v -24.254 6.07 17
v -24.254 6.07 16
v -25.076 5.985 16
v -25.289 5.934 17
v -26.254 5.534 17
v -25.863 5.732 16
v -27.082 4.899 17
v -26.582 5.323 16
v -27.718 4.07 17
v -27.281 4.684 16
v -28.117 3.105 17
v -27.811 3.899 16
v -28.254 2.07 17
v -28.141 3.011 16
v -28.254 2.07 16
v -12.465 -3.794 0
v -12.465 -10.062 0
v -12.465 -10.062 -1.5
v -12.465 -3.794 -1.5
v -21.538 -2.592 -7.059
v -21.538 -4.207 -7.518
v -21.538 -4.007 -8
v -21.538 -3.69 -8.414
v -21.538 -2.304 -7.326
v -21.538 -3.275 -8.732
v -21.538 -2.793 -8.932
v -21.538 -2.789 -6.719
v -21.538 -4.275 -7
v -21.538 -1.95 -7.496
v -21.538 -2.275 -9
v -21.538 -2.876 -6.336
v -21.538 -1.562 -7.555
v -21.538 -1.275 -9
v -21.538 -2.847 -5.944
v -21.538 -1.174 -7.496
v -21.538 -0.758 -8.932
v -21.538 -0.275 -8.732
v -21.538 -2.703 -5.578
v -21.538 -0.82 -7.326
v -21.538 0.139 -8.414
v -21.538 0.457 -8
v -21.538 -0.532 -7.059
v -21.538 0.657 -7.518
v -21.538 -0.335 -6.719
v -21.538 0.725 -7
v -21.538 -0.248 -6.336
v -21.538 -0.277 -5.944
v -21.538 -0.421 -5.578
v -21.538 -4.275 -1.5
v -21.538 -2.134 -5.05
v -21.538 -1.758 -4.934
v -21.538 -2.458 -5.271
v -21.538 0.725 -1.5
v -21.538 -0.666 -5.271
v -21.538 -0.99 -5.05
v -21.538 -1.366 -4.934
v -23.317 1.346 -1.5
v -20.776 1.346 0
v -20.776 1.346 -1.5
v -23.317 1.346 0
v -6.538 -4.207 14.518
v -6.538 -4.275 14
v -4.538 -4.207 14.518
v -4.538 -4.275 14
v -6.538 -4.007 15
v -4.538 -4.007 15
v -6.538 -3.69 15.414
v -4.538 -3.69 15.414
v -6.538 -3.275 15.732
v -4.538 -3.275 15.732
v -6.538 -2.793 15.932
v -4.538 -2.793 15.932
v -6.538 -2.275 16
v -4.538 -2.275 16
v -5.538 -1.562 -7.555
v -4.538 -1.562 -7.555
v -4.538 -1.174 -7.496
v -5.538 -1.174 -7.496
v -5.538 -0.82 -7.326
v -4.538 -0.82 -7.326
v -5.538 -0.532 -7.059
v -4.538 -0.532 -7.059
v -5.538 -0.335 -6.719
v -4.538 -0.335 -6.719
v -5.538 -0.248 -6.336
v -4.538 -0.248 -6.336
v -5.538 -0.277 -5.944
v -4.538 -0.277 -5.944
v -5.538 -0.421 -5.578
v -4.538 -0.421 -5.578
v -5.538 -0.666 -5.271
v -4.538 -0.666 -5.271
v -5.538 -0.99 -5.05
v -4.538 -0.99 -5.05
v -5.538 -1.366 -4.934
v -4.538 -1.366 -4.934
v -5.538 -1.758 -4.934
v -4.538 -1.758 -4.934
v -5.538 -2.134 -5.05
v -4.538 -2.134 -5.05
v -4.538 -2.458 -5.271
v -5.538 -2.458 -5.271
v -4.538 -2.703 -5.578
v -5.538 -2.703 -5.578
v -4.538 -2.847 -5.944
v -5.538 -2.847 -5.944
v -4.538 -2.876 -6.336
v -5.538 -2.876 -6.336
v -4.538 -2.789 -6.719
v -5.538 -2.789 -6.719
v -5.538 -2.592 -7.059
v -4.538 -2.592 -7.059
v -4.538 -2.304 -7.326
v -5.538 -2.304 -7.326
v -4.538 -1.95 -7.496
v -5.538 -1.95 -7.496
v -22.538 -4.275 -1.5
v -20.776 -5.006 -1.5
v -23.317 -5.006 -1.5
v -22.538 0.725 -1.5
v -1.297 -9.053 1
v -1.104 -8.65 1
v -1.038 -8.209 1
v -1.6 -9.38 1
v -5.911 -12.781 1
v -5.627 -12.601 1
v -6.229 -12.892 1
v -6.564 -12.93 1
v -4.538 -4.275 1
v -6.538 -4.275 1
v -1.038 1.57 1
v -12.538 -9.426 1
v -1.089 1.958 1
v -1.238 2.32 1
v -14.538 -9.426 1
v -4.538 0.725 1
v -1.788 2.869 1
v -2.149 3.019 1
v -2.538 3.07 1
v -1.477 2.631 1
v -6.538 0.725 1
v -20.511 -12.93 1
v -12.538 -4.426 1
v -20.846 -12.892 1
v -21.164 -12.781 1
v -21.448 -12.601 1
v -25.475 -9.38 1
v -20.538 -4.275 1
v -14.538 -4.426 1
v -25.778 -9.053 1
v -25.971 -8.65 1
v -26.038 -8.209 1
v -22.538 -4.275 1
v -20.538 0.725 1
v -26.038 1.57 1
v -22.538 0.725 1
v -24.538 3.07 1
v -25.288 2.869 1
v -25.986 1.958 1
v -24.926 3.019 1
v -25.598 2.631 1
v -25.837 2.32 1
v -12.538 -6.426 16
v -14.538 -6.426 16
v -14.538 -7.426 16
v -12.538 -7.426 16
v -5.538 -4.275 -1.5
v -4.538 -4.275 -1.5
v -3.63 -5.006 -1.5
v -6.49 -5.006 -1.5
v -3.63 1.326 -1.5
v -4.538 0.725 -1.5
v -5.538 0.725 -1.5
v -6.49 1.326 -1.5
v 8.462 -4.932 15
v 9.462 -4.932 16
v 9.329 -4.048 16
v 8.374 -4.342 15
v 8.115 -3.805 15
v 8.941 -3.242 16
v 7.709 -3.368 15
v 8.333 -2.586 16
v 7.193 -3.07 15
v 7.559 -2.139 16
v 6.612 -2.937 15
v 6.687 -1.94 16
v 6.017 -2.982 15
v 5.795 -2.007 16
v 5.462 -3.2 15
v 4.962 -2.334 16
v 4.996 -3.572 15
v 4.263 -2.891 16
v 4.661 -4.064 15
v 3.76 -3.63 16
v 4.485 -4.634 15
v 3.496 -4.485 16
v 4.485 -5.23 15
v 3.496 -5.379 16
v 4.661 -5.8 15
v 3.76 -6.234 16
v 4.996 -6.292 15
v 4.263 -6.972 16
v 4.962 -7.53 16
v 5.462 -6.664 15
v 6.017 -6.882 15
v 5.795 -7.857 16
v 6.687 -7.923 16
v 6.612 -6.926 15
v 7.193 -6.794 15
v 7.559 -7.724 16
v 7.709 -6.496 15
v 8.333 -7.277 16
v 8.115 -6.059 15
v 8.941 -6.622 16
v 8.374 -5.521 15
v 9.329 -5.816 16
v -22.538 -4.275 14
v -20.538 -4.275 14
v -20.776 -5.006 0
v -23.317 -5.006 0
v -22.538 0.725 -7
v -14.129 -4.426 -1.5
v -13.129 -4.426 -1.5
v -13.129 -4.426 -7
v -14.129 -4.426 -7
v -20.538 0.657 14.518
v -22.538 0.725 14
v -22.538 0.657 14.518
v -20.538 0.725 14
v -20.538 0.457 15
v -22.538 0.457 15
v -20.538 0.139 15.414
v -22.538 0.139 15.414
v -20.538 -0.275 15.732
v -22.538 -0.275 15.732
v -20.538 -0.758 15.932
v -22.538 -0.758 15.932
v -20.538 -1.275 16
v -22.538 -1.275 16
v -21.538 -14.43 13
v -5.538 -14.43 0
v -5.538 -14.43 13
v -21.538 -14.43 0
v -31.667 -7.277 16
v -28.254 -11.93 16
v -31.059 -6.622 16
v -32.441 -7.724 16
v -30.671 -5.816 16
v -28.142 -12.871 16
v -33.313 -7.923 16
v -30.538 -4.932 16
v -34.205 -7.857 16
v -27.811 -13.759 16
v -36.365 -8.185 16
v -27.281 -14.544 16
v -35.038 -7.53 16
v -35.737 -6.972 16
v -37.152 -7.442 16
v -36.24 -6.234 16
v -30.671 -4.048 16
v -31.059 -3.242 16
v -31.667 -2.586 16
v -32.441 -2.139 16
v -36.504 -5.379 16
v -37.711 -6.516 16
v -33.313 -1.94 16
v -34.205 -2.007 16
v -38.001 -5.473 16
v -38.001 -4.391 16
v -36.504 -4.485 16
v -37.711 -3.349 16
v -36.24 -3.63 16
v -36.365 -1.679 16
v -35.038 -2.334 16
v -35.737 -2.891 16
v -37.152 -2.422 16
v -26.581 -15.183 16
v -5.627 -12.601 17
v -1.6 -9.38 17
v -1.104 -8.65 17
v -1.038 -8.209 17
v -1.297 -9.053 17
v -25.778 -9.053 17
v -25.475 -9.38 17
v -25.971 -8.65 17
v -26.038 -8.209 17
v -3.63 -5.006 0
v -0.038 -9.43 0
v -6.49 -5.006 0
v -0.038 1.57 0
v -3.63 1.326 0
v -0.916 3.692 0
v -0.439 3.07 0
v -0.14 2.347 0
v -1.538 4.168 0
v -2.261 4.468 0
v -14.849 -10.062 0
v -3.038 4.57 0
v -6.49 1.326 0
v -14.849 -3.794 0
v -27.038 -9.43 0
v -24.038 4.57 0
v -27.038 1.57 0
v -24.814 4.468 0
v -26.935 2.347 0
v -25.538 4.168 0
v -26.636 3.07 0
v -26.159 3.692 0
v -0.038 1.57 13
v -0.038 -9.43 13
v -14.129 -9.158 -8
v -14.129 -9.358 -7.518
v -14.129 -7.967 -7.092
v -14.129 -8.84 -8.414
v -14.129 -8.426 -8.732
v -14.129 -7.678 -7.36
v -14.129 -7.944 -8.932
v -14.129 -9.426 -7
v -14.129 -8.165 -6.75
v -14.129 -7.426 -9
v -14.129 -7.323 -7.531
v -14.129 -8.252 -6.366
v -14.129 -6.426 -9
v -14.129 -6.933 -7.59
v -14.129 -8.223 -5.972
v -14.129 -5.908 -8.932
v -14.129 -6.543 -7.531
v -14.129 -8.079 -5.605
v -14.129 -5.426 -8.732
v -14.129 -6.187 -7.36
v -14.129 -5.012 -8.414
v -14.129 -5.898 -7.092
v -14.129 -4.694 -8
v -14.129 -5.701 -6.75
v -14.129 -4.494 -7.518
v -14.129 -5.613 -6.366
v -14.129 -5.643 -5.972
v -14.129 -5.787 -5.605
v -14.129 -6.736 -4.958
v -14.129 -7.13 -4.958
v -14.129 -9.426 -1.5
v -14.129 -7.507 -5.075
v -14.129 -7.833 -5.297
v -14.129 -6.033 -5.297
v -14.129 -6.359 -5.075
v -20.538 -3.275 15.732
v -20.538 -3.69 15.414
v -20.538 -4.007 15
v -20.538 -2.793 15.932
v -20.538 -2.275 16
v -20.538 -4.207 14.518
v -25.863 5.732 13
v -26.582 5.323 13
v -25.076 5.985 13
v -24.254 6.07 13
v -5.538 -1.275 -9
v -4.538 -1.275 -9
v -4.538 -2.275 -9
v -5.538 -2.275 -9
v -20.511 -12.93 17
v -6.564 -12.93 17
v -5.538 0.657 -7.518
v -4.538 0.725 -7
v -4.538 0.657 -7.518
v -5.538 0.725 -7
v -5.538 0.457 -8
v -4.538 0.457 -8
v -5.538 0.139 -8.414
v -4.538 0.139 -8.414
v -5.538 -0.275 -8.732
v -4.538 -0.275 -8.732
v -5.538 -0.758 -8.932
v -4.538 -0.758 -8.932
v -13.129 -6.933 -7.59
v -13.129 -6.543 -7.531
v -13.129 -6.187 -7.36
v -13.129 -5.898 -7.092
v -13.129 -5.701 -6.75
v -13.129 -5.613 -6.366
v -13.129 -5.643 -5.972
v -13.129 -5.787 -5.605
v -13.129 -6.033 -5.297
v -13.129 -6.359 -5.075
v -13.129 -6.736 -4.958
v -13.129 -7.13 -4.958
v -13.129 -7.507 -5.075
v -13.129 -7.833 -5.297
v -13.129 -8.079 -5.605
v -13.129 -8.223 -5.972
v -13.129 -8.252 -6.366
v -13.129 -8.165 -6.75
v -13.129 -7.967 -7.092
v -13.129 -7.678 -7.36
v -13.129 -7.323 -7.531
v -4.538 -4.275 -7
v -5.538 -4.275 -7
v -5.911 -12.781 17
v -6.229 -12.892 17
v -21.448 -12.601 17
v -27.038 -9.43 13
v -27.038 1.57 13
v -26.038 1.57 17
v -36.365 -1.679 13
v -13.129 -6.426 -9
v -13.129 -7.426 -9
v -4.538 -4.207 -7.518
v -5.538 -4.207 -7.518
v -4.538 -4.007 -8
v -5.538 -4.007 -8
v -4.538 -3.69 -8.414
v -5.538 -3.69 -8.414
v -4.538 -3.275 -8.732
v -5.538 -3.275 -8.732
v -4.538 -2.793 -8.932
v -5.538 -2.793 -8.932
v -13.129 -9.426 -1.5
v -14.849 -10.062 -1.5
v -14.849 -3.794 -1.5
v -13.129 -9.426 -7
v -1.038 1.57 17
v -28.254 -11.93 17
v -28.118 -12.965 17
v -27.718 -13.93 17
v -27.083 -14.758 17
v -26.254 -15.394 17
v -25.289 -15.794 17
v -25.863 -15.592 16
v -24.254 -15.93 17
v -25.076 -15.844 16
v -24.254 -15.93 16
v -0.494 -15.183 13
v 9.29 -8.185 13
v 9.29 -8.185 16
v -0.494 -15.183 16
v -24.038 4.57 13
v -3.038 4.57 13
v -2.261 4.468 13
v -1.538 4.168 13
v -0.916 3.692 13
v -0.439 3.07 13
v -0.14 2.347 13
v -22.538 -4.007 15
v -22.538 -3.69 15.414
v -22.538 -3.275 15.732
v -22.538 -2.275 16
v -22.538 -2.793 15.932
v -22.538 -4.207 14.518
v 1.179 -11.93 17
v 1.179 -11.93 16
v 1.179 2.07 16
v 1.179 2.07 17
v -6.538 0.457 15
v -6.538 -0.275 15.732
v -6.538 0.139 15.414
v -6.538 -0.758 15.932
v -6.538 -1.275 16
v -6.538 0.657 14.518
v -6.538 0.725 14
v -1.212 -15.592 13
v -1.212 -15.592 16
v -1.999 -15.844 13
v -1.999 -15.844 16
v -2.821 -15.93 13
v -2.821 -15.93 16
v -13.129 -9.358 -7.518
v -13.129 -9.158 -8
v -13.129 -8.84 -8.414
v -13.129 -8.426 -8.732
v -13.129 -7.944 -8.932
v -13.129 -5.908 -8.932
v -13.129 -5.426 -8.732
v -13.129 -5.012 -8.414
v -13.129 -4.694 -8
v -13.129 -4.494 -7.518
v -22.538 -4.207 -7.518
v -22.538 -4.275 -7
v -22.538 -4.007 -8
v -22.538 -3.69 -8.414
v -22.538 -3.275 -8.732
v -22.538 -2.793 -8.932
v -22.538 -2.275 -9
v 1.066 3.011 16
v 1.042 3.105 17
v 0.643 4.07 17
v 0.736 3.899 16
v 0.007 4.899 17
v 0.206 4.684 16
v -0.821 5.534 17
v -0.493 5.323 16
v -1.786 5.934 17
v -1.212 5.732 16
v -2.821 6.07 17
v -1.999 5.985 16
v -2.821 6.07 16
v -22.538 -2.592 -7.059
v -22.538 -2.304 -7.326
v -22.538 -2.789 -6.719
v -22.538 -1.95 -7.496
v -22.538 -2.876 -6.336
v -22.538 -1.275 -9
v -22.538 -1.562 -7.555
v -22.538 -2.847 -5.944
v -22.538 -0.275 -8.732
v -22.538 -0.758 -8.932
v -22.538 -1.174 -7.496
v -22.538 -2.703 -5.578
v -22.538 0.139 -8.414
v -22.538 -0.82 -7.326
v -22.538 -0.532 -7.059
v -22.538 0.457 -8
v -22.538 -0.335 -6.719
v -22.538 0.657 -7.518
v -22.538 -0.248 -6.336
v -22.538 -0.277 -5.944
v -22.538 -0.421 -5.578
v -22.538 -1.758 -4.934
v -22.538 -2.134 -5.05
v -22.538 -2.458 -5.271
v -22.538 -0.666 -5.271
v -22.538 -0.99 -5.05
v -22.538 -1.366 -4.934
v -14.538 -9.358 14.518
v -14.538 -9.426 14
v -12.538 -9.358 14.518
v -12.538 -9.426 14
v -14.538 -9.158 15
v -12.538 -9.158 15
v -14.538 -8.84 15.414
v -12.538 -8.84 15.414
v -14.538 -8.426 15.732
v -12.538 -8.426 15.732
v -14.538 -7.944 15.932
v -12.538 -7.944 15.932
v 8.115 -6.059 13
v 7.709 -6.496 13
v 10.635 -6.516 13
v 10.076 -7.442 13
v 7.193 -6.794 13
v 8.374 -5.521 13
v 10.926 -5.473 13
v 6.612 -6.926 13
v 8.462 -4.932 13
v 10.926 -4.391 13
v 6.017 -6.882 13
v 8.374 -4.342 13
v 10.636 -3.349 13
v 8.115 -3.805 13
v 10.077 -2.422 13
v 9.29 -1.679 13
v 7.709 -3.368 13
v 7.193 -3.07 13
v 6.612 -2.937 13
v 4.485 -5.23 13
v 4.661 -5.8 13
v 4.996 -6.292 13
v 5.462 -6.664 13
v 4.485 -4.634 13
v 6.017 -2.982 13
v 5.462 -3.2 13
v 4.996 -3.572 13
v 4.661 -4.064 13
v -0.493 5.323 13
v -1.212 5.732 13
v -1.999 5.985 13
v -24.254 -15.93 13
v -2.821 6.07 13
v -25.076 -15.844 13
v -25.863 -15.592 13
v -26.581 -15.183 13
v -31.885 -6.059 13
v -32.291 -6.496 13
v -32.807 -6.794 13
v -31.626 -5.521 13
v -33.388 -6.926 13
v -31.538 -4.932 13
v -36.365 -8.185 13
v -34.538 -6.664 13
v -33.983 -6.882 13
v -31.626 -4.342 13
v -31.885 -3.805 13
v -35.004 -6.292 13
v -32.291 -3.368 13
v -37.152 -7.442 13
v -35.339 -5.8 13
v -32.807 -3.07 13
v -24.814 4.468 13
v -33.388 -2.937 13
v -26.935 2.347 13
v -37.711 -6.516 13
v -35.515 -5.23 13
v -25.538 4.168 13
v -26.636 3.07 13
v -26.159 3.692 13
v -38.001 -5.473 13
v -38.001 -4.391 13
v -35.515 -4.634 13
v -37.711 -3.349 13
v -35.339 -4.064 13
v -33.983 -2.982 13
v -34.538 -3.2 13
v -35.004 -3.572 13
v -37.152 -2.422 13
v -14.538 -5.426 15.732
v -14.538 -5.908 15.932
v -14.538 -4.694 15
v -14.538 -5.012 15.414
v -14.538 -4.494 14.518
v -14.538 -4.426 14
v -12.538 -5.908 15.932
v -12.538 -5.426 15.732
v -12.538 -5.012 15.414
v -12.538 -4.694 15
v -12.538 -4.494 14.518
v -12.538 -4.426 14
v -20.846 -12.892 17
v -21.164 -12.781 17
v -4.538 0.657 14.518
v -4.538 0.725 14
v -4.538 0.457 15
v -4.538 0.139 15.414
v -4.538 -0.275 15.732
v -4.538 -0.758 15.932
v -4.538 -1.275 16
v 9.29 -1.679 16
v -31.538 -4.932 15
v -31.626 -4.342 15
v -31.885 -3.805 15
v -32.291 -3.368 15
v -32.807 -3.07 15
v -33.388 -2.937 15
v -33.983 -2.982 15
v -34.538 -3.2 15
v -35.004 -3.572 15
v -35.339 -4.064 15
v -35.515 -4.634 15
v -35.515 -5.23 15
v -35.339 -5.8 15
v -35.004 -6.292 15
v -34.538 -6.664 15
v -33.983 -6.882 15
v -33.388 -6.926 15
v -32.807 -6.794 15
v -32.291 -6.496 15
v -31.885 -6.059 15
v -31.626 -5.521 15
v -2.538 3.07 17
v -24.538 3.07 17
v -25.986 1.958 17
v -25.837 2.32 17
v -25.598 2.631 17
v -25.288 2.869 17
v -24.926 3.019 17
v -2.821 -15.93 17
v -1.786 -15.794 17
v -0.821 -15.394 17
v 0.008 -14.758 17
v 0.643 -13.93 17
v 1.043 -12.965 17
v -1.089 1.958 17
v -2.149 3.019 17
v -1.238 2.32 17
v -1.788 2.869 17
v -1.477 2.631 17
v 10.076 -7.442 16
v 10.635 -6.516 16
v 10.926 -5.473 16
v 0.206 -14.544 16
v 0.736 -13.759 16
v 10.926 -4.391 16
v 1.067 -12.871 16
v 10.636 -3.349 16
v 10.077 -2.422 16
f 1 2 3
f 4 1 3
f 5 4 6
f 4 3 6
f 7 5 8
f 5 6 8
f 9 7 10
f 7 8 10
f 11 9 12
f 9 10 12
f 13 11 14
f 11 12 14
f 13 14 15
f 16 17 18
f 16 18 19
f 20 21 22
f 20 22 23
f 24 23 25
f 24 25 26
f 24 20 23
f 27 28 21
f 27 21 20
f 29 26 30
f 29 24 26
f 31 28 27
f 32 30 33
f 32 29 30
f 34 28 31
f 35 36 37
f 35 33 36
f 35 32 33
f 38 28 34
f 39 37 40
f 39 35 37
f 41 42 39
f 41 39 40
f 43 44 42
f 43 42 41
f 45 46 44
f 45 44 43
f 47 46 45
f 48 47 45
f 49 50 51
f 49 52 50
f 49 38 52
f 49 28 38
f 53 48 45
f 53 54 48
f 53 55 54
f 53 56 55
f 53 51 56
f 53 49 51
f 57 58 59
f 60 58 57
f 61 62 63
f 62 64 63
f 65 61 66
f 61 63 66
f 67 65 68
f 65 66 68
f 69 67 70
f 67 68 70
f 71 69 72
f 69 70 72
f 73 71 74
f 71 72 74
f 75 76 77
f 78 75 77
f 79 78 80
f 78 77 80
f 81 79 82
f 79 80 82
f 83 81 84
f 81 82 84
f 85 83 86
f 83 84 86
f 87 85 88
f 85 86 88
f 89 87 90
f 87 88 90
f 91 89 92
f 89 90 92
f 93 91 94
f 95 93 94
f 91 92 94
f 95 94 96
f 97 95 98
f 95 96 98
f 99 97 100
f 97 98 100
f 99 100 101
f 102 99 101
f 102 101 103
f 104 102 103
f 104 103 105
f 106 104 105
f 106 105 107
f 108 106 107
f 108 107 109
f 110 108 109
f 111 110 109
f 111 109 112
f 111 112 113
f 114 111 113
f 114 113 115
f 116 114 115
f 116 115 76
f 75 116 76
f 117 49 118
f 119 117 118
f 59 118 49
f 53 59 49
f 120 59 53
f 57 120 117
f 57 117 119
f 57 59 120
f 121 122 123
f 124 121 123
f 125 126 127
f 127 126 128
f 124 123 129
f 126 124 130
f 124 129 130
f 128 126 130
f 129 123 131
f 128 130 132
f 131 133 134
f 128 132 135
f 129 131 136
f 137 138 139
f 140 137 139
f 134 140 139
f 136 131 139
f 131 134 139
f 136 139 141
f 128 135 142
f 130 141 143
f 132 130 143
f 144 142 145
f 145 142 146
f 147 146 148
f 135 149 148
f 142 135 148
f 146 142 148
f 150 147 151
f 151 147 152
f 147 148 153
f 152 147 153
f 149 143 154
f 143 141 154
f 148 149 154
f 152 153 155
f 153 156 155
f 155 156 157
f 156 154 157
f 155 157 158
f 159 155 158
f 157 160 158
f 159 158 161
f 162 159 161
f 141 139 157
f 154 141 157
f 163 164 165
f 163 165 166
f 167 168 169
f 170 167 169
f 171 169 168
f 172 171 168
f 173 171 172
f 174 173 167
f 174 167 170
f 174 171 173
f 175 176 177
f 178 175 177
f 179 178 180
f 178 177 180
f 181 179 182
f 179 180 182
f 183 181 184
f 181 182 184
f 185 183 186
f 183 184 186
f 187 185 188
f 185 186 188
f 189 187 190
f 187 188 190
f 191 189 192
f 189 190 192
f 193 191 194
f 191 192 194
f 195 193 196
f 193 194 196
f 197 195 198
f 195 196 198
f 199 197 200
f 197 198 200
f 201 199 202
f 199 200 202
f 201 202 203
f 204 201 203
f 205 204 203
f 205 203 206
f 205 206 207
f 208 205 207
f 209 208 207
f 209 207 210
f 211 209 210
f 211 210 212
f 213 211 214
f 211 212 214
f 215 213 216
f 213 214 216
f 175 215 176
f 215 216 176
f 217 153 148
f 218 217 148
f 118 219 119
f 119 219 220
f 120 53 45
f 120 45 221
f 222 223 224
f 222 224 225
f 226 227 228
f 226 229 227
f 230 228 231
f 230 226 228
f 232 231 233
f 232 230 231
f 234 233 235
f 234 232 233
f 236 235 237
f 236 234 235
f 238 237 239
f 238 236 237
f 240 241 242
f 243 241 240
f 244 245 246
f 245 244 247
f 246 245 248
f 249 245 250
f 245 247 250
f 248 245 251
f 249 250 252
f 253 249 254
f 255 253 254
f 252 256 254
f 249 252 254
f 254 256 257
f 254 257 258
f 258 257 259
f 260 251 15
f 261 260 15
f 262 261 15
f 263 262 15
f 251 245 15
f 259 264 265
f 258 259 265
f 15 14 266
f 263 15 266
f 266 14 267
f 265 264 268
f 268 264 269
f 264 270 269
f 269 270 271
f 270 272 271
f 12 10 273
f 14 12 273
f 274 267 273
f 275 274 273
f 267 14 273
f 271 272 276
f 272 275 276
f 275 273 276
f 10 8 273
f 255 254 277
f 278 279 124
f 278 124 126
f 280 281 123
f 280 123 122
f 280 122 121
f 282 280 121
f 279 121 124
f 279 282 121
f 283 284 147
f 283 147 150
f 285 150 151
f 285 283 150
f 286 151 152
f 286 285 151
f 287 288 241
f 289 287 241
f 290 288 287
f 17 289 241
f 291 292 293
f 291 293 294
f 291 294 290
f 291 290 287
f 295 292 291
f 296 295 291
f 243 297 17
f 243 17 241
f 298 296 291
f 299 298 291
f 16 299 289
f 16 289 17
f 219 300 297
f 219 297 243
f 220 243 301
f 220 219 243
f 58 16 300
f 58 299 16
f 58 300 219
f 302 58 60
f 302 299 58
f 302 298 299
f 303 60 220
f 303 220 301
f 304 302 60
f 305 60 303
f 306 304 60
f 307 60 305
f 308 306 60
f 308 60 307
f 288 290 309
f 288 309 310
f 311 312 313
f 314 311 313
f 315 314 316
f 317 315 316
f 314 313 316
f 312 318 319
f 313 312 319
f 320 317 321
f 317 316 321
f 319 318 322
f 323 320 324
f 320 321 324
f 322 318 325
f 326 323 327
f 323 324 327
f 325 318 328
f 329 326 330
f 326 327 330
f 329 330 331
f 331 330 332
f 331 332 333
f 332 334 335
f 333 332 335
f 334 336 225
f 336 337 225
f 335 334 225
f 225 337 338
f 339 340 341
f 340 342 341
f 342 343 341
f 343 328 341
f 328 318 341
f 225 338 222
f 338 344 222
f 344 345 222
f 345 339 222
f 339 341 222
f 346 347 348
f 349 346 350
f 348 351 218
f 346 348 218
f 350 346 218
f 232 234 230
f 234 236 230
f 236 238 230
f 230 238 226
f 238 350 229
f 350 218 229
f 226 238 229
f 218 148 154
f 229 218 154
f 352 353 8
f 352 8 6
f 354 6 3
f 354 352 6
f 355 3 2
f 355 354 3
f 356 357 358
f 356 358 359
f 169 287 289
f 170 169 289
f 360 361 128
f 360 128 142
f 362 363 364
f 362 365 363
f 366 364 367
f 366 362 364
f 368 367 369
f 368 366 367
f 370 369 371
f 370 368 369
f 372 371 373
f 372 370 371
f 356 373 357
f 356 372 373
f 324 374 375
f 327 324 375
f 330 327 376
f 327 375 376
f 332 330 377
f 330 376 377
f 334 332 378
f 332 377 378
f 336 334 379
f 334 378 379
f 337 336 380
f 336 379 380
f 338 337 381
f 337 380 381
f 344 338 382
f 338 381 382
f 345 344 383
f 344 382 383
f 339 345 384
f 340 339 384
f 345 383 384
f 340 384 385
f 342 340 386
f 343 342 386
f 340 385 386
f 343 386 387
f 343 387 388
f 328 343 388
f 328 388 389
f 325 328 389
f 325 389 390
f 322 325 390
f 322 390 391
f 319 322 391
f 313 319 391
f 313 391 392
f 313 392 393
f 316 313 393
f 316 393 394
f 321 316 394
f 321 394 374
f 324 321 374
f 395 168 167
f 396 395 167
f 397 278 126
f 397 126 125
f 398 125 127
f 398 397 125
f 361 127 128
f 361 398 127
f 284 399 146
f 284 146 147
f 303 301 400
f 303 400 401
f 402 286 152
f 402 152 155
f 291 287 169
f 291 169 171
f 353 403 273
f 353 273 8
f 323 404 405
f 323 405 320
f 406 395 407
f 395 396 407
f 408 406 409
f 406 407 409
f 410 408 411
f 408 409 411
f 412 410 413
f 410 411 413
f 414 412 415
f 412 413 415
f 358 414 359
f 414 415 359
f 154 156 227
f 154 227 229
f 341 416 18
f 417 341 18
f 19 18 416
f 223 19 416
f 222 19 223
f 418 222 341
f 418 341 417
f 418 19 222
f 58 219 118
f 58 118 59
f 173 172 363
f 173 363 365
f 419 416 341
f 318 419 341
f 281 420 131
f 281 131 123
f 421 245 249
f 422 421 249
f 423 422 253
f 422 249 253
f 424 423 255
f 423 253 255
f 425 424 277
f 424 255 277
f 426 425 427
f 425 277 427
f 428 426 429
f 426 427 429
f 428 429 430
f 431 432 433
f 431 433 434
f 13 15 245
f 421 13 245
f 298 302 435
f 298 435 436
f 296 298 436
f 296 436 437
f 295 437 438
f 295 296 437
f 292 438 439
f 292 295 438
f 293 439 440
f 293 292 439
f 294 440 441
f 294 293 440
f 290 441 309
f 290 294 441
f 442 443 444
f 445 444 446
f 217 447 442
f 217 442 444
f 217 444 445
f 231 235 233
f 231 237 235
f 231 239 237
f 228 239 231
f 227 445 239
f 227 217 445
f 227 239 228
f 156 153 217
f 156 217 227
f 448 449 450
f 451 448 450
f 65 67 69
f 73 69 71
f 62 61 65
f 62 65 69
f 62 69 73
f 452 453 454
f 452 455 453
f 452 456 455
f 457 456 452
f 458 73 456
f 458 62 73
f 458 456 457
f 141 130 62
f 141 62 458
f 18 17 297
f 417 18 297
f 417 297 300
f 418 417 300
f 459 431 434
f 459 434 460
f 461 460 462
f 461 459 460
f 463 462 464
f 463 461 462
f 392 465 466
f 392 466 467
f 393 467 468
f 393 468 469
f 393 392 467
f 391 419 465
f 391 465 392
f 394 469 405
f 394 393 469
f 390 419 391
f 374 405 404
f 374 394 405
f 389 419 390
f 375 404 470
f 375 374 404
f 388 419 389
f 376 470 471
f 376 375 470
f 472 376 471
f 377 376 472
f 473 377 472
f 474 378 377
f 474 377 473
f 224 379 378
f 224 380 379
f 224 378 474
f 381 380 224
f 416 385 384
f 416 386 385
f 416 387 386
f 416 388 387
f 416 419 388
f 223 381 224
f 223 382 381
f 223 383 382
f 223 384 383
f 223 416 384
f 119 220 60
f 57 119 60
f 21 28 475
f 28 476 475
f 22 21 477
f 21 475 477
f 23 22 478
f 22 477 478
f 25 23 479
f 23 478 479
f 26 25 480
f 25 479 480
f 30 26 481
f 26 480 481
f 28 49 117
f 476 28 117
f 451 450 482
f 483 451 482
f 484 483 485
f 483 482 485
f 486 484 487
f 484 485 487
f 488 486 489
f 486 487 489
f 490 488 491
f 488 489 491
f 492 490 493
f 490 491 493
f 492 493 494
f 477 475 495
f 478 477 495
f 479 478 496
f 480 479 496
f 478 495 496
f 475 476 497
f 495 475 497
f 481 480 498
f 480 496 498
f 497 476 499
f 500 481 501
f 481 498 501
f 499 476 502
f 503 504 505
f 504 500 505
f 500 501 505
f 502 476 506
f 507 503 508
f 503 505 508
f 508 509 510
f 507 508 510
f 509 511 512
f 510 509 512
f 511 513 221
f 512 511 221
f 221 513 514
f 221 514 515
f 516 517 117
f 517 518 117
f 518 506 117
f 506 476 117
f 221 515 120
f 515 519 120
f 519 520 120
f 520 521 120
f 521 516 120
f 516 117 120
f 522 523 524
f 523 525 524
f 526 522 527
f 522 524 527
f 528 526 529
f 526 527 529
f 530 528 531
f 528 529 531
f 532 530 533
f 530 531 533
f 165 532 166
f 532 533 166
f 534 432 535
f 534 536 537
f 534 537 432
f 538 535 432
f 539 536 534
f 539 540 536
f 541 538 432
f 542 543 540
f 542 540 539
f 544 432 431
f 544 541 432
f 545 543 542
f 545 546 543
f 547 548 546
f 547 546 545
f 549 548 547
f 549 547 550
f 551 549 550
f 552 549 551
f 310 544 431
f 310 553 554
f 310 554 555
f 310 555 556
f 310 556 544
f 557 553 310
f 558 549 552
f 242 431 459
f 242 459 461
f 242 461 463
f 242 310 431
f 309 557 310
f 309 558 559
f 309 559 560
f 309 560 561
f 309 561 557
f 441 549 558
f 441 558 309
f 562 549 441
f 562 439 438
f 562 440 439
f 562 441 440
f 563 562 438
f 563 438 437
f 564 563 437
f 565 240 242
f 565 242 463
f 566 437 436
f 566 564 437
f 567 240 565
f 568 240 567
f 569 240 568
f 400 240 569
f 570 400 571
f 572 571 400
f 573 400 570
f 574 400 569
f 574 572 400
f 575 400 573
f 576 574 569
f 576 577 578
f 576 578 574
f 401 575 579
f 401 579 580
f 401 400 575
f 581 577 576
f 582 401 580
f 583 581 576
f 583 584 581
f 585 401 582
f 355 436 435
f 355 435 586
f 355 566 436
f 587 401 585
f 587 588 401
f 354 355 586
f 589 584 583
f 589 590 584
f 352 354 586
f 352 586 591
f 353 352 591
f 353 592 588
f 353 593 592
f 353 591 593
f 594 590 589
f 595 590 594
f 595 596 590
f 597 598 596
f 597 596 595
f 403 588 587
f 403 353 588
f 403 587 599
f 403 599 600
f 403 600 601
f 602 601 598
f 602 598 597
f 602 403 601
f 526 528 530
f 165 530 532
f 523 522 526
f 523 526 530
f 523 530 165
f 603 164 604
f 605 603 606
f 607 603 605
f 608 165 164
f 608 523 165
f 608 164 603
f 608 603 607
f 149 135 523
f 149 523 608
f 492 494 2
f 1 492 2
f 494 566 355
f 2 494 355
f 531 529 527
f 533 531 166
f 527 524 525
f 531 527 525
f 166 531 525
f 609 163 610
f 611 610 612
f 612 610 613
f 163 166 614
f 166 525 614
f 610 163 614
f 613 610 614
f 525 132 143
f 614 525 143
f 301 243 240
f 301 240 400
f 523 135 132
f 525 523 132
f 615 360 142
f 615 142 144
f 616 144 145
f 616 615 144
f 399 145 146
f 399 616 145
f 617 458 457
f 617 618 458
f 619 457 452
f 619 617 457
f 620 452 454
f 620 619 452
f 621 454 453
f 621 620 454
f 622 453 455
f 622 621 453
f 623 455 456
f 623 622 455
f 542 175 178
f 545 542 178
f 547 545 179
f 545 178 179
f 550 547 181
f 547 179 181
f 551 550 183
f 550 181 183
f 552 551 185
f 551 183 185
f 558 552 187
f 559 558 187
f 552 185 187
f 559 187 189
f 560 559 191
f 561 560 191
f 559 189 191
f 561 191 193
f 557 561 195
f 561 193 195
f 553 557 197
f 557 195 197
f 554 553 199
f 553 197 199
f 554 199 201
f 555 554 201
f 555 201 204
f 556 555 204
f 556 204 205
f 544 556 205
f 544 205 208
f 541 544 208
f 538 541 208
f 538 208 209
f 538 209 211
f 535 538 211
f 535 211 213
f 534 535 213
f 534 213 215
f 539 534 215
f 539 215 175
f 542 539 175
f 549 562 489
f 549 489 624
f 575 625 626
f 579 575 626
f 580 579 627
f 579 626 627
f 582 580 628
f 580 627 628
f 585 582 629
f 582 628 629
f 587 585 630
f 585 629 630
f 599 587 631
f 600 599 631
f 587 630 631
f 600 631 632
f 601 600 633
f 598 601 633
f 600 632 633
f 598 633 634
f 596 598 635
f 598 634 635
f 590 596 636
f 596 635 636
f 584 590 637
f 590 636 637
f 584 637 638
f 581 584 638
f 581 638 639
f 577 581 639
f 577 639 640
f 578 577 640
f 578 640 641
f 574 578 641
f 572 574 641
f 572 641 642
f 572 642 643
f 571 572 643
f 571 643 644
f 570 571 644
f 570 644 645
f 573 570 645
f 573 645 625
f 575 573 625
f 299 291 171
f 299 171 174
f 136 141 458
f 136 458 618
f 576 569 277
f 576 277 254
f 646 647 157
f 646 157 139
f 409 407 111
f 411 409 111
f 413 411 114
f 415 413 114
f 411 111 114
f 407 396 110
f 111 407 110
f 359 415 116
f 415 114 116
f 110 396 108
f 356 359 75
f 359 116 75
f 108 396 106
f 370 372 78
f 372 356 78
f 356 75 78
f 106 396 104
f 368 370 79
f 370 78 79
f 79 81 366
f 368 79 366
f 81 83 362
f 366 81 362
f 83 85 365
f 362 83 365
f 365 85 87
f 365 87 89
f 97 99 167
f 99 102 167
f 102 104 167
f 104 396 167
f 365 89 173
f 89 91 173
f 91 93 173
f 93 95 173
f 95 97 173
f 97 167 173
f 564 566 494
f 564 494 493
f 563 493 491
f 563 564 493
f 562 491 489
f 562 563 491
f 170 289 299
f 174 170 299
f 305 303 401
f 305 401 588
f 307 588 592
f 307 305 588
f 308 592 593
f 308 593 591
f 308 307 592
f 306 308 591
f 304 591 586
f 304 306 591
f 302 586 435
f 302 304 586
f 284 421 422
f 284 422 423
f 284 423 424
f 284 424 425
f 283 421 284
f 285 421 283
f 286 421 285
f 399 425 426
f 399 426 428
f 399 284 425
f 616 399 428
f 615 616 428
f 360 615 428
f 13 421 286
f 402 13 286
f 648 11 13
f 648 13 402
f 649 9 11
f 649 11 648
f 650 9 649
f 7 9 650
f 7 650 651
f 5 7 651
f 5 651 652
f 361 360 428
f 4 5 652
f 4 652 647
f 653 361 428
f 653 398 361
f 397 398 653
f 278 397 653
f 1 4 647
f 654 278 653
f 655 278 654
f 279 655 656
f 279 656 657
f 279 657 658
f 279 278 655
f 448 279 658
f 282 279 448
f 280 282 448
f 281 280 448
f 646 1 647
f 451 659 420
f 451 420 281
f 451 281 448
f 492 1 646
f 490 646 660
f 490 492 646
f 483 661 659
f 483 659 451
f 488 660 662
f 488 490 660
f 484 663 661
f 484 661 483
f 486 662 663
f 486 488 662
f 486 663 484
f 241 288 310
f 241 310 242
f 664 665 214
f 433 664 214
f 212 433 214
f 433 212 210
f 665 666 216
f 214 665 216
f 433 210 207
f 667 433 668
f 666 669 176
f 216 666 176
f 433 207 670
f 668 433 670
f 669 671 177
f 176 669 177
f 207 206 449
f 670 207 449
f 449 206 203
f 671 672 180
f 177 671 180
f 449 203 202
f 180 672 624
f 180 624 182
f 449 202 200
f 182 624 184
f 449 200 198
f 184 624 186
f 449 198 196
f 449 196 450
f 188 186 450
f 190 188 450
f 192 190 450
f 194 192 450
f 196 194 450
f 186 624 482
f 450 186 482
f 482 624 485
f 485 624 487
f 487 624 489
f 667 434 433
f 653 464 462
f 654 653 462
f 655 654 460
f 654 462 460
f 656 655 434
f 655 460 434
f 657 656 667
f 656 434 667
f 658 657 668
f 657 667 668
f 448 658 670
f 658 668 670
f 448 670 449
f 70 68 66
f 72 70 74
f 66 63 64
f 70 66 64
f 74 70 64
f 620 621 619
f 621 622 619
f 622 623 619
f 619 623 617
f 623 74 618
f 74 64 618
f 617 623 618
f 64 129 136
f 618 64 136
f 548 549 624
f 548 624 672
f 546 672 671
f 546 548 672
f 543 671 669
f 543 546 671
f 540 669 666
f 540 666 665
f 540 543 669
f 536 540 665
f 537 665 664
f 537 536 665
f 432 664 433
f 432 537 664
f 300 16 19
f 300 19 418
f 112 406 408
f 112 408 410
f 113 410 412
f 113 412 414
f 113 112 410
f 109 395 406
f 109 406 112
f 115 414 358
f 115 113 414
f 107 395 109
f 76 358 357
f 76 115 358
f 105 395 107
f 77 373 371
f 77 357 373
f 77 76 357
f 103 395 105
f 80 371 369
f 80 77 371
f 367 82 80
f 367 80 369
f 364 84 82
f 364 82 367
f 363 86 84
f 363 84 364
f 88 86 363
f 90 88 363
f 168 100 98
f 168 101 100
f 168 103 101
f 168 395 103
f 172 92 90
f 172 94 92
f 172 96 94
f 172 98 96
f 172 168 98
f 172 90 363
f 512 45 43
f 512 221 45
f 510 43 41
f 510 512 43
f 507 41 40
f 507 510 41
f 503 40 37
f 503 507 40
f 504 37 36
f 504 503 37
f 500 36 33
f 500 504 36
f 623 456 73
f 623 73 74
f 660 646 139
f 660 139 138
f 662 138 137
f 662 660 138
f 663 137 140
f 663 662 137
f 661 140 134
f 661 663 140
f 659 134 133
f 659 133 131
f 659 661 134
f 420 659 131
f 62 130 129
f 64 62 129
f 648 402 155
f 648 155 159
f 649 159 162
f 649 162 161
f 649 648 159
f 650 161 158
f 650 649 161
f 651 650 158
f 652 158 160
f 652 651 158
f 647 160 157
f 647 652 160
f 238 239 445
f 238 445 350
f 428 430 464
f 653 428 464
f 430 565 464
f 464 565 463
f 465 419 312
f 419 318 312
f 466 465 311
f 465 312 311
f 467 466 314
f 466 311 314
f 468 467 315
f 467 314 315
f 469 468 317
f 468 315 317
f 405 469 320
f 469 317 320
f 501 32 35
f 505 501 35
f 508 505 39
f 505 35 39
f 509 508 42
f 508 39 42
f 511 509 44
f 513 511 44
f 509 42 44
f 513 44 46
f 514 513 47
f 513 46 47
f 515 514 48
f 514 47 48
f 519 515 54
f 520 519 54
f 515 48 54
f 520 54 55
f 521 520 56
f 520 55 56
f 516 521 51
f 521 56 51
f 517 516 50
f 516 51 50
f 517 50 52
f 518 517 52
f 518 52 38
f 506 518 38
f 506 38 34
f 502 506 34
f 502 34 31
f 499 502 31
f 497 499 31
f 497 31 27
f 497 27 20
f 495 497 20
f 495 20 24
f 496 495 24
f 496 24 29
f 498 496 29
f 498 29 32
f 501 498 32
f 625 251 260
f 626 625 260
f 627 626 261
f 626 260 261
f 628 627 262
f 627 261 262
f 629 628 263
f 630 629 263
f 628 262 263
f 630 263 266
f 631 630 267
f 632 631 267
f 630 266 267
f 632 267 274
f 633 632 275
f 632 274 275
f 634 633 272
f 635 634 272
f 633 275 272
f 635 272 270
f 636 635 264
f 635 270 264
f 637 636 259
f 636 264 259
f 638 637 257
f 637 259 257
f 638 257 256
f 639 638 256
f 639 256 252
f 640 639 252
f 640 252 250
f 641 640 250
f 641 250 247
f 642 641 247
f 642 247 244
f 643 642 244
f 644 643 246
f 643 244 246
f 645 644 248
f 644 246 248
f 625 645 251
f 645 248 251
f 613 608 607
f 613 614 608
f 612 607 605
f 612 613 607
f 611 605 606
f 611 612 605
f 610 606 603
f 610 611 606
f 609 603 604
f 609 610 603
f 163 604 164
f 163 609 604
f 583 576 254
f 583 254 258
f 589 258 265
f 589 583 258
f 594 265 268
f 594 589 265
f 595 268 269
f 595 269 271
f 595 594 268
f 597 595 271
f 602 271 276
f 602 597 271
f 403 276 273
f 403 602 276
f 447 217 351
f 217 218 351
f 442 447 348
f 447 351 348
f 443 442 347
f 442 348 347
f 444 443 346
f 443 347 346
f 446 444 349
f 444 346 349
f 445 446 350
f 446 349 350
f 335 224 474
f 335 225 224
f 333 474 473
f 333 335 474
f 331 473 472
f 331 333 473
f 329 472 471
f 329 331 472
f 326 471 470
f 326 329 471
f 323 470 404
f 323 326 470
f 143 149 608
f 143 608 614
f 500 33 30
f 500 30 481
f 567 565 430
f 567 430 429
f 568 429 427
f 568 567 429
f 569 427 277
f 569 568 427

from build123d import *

# Parameters (mm, degrees)
EXTRUDE_1_DEPTH     = 13
EXTRUDE_2_DEPTH     = 3
EXTRUDE_3_DEPTH     = 1
CUT_EXTRUDE_1_DEPTH = 16
SKETCH_5_W          = 2
SKETCH_5_H          = 5
EXTRUDE_4_DEPTH     = 15
FILLET_1_R          = 2
SKETCH_6_W          = 1.000000004
SKETCH_6_H          = 5
SKETCH_6_W_2        = 0.999999996
SKETCH_6_W_3        = 1
EXTRUDE_5_DEPTH     = 9
SKETCH_7_W          = 2.859887346
SKETCH_7_H          = 6.332607693
SKETCH_7_W_2        = 2.383674024
SKETCH_7_H_2        = 6.268510199
SKETCH_7_W_3        = 2.540472095
SKETCH_7_H_3        = 6.351983774
EXTRUDE_7_DEPTH     = 1.5
SKETCH_8_R          = 1.317694444
CUT_EXTRUDE_2_DEPTH = 21.5
SKETCH_9_R          = 1.323361973
CUT_EXTRUDE_3_DEPTH = 3.5
FILLET_2_R          = 2
SKETCH_10_R         = 2
CUT_EXTRUDE_4_DEPTH = 3.5
SKETCH_11_R         = 2
CUT_EXTRUDE_5_DEPTH = 3.5
CHAMFER_1_SIZE      = 1


with BuildPart() as part:
    # Эскиз1 → Бобышка-Вытянуть1 (new body)
    with BuildSketch(Plane.XY):
        with BuildLine():
            Line((-24.03751348, 4.570186882), (-3.03751348, 4.570186882))
            ThreePointArc((-3.03751348, 4.570186882), (-0.916193137, 3.691507225), (-0.03751348, 1.570186882))
            Line((-0.03751348, 1.570186882), (-0.03751348, -9.429813118))
            Line((-0.03751348, -9.429813118), (-5.53751348, -14.429813118))
            Line((-5.53751348, -14.429813118), (-21.53751348, -14.429813118))
            Line((-21.53751348, -14.429813118), (-27.03751348, -9.429813118))
            Line((-27.03751348, -9.429813118), (-27.03751348, 1.570186882))
            ThreePointArc((-27.03751348, 1.570186882), (-26.158833824, 3.691507225), (-24.03751348, 4.570186882))
        make_face()
    extrude(amount=EXTRUDE_1_DEPTH)

    # Эскиз2 → Бобышка-Вытянуть2 (add)
    with BuildSketch(Plane.XY.offset(13)):
        with BuildLine():
            Line((-24.253629022, 6.070186882), (-2.821397929, 6.070186882))
            ThreePointArc((-2.821397929, 6.070186882), (-1.598940451, 5.87880838), (-0.493459013, 5.322985739))
            Line((-0.493459013, 5.322985739), (9.290425441, -1.679071989))
            ThreePointArc((9.290425441, -1.679071989), (10.962486488, -4.932373697), (9.289607579, -8.185254927))
            Line((9.289607579, -8.185254927), (-0.493722264, -15.183197119))
            ThreePointArc((-0.493722264, -15.183197119), (-1.598864627, -15.738588249), (-2.820843349, -15.929813118))
            Line((-2.820843349, -15.929813118), (-24.254183602, -15.929813118))
            ThreePointArc((-24.254183602, -15.929813118), (-25.476162332, -15.738588247), (-26.5813047, -15.183197109))
            Line((-26.5813047, -15.183197109), (-36.364634505, -8.185254887))
            ThreePointArc((-36.364634505, -8.185254887), (-38.037513448, -4.932373739), (-36.365452436, -1.679072079))
            Line((-36.365452436, -1.679072079), (-26.581567951, 5.322985729))
            ThreePointArc((-26.581567951, 5.322985729), (-25.476086508, 5.878808377), (-24.253629022, 6.070186882))
        make_face()
    extrude(amount=EXTRUDE_2_DEPTH)

    # Эскиз3 → Бобышка-Вытянуть3 (add)
    with BuildSketch(Plane.XY.offset(16)):
        with BuildLine():
            Line((-24.254183602, -15.929813118), (-2.820843349, -15.929813118))
            ThreePointArc((-2.820843349, -15.929813118), (0.007639796, -14.758184221), (1.179156647, -11.929654667))
            Line((1.179156647, -11.929654667), (1.178602071, 2.070186882))
            ThreePointArc((1.178602071, 2.070186882), (0.007029196, 4.898614007), (-2.821397929, 6.070186882))
            Line((-2.821397929, 6.070186882), (-24.253629022, 6.070186882))
            ThreePointArc((-24.253629022, 6.070186882), (-27.082056147, 4.898614007), (-28.253629022, 2.070186882))
            Line((-28.253629022, 2.070186882), (-28.254183602, -11.929813118))
            ThreePointArc((-28.254183602, -11.929813118), (-27.082610727, -14.758240243), (-24.254183602, -15.929813118))
        make_face()
    extrude(amount=EXTRUDE_3_DEPTH)

    # Эскиз4 → Вырез-Вытянуть1 (cut)
    with BuildSketch(Plane.XY.offset(17)):
        with BuildLine():
            Line((-24.537513476, 3.070186882), (-2.537513476, 3.070186882))
            ThreePointArc((-2.537513476, 3.070186882), (-1.476853304, 2.630847054), (-1.037513476, 1.570186882))
            Line((-1.037513476, 1.570186882), (-1.037513476, -8.208875847))
            ThreePointArc((-1.037513476, -8.208875847), (-1.185558621, -8.858658943), (-1.600470904, -9.380179061))
            Line((-1.600470904, -9.380179061), (-5.626642493, -12.601116332))
            ThreePointArc((-5.626642493, -12.601116332), (-6.067174653, -12.845255597), (-6.563685065, -12.929813118))
            Line((-6.563685065, -12.929813118), (-20.511341887, -12.929813118))
            ThreePointArc((-20.511341887, -12.929813118), (-21.007852299, -12.845255597), (-21.448384458, -12.601116332))
            Line((-21.448384458, -12.601116332), (-25.474556047, -9.380179061))
            ThreePointArc((-25.474556047, -9.380179061), (-25.88946833, -8.858658943), (-26.037513476, -8.208875847))
            Line((-26.037513476, -8.208875847), (-26.037513476, 1.570186882))
            ThreePointArc((-26.037513476, 1.570186882), (-25.598173647, 2.630847054), (-24.537513476, 3.070186882))
        make_face()
    extrude(amount=-CUT_EXTRUDE_1_DEPTH, mode=Mode.SUBTRACT)

    # Эскиз5 → Бобышка-Вытянуть4 (add)
    with BuildSketch(Plane.XY.offset(1)):
        with Locations((-21.537513476, -1.775325657)):
            Rectangle(SKETCH_5_W, SKETCH_5_H)
        with Locations((-13.537513476, -6.926056238)):
            Rectangle(SKETCH_5_W, SKETCH_5_H)
        with Locations((-5.537513476, -1.775325657)):
            Rectangle(SKETCH_5_W, SKETCH_5_H)
    extrude(amount=EXTRUDE_4_DEPTH)

    # Скругление1
    fillet_1_edges = [part.edges().sort_by_distance(p)[0] for p in [
        (-21.537513476, -4.275325657, 16),
        (-21.537513476, 0.724674343, 16),
        (-13.537513476, -9.426056238, 16),
        (-13.537513476, -4.426056238, 16),
        (-5.537513476, -4.275325657, 16),
        (-5.537513476, 0.724674343, 16),
    ]]
    fillet(fillet_1_edges, radius=FILLET_1_R)

    # Эскиз6 → Бобышка-Вытянуть5 (add)
    with BuildSketch(Plane(origin=(0, 0, 0), x_dir=(-1, 0, 0), z_dir=(0, 0, -1))):
        with Locations((5.037513478, -1.775325657)):
            Rectangle(SKETCH_6_W, SKETCH_6_H)
        with Locations((22.037513478, -1.775325657)):
            Rectangle(SKETCH_6_W_2, SKETCH_6_H)
        with Locations((13.628958145, -6.926056238)):
            Rectangle(SKETCH_6_W_3, SKETCH_6_H)
    extrude(amount=EXTRUDE_5_DEPTH)

    # Эскиз7 → Бобышка-Вытянуть7 (add)
    with BuildSketch(Plane(origin=(0, 0, 0), x_dir=(-1, 0, 0), z_dir=(0, 0, -1))):
        with Locations((5.059990277, -1.840113397)):
            Rectangle(SKETCH_7_W, SKETCH_7_H)
        with Locations((13.656892737, -6.928034415)):
            Rectangle(SKETCH_7_W_2, SKETCH_7_H_2)
        with Locations((22.046734018, -1.830425356)):
            Rectangle(SKETCH_7_W_3, SKETCH_7_H_3)
    extrude(amount=EXTRUDE_7_DEPTH)

    # Эскиз8 → Вырез-Вытянуть2 (cut)
    with BuildSketch(Plane(origin=(-4.537513476, 0, 0), x_dir=(0, 0, -1), z_dir=(1, 0, 0))):
        with Locations((6.23718035, -1.561929148)):
            Circle(SKETCH_8_R)
    extrude(amount=-CUT_EXTRUDE_2_DEPTH, mode=Mode.SUBTRACT)

    # Эскиз9 → Вырез-Вытянуть3 (cut)
    with BuildSketch(Plane(origin=(-13.128958145, 0, 0), x_dir=(0, 0, -1), z_dir=(1, 0, 0))):
        with Locations((6.266853337, -6.932739708)):
            Circle(SKETCH_9_R)
    extrude(amount=-CUT_EXTRUDE_3_DEPTH, mode=Mode.SUBTRACT)

    # Скругление2
    fillet_2_edges = [part.edges().sort_by_distance(p)[0] for p in [
        (-5.037513478, -4.275325657, -9),
        (-5.037513478, 0.724674343, -9),
        (-22.037513478, 0.724674343, -9),
        (-22.037513478, -4.275325657, -9),
        (-13.628958145, -9.426056238, -9),
        (-13.628958145, -4.426056238, -9),
    ]]
    fillet(fillet_2_edges, radius=FILLET_2_R)

    # Эскиз10 → Вырез-Вытянуть4 (cut)
    with BuildSketch(Plane.XY.offset(16)):
        with Locations((6.462486524, -4.931870875)):
            Circle(SKETCH_10_R)
    extrude(amount=-CUT_EXTRUDE_4_DEPTH, mode=Mode.SUBTRACT)

    # Эскиз11 → Вырез-Вытянуть5 (cut)
    with BuildSketch(Plane.XY.offset(16)):
        with Locations((-33.537513476, -4.931870875)):
            Circle(SKETCH_11_R)
    extrude(amount=-CUT_EXTRUDE_5_DEPTH, mode=Mode.SUBTRACT)

    # Фаска1
    chamfer_1_edges = [part.edges().sort_by_distance(p)[0] for p in [
        (4.462486524, -4.931870875, 16),
        (-35.537513476, -4.931870875, 16),
    ]]
    chamfer(chamfer_1_edges, length=CHAMFER_1_SIZE)


solid = part.part
